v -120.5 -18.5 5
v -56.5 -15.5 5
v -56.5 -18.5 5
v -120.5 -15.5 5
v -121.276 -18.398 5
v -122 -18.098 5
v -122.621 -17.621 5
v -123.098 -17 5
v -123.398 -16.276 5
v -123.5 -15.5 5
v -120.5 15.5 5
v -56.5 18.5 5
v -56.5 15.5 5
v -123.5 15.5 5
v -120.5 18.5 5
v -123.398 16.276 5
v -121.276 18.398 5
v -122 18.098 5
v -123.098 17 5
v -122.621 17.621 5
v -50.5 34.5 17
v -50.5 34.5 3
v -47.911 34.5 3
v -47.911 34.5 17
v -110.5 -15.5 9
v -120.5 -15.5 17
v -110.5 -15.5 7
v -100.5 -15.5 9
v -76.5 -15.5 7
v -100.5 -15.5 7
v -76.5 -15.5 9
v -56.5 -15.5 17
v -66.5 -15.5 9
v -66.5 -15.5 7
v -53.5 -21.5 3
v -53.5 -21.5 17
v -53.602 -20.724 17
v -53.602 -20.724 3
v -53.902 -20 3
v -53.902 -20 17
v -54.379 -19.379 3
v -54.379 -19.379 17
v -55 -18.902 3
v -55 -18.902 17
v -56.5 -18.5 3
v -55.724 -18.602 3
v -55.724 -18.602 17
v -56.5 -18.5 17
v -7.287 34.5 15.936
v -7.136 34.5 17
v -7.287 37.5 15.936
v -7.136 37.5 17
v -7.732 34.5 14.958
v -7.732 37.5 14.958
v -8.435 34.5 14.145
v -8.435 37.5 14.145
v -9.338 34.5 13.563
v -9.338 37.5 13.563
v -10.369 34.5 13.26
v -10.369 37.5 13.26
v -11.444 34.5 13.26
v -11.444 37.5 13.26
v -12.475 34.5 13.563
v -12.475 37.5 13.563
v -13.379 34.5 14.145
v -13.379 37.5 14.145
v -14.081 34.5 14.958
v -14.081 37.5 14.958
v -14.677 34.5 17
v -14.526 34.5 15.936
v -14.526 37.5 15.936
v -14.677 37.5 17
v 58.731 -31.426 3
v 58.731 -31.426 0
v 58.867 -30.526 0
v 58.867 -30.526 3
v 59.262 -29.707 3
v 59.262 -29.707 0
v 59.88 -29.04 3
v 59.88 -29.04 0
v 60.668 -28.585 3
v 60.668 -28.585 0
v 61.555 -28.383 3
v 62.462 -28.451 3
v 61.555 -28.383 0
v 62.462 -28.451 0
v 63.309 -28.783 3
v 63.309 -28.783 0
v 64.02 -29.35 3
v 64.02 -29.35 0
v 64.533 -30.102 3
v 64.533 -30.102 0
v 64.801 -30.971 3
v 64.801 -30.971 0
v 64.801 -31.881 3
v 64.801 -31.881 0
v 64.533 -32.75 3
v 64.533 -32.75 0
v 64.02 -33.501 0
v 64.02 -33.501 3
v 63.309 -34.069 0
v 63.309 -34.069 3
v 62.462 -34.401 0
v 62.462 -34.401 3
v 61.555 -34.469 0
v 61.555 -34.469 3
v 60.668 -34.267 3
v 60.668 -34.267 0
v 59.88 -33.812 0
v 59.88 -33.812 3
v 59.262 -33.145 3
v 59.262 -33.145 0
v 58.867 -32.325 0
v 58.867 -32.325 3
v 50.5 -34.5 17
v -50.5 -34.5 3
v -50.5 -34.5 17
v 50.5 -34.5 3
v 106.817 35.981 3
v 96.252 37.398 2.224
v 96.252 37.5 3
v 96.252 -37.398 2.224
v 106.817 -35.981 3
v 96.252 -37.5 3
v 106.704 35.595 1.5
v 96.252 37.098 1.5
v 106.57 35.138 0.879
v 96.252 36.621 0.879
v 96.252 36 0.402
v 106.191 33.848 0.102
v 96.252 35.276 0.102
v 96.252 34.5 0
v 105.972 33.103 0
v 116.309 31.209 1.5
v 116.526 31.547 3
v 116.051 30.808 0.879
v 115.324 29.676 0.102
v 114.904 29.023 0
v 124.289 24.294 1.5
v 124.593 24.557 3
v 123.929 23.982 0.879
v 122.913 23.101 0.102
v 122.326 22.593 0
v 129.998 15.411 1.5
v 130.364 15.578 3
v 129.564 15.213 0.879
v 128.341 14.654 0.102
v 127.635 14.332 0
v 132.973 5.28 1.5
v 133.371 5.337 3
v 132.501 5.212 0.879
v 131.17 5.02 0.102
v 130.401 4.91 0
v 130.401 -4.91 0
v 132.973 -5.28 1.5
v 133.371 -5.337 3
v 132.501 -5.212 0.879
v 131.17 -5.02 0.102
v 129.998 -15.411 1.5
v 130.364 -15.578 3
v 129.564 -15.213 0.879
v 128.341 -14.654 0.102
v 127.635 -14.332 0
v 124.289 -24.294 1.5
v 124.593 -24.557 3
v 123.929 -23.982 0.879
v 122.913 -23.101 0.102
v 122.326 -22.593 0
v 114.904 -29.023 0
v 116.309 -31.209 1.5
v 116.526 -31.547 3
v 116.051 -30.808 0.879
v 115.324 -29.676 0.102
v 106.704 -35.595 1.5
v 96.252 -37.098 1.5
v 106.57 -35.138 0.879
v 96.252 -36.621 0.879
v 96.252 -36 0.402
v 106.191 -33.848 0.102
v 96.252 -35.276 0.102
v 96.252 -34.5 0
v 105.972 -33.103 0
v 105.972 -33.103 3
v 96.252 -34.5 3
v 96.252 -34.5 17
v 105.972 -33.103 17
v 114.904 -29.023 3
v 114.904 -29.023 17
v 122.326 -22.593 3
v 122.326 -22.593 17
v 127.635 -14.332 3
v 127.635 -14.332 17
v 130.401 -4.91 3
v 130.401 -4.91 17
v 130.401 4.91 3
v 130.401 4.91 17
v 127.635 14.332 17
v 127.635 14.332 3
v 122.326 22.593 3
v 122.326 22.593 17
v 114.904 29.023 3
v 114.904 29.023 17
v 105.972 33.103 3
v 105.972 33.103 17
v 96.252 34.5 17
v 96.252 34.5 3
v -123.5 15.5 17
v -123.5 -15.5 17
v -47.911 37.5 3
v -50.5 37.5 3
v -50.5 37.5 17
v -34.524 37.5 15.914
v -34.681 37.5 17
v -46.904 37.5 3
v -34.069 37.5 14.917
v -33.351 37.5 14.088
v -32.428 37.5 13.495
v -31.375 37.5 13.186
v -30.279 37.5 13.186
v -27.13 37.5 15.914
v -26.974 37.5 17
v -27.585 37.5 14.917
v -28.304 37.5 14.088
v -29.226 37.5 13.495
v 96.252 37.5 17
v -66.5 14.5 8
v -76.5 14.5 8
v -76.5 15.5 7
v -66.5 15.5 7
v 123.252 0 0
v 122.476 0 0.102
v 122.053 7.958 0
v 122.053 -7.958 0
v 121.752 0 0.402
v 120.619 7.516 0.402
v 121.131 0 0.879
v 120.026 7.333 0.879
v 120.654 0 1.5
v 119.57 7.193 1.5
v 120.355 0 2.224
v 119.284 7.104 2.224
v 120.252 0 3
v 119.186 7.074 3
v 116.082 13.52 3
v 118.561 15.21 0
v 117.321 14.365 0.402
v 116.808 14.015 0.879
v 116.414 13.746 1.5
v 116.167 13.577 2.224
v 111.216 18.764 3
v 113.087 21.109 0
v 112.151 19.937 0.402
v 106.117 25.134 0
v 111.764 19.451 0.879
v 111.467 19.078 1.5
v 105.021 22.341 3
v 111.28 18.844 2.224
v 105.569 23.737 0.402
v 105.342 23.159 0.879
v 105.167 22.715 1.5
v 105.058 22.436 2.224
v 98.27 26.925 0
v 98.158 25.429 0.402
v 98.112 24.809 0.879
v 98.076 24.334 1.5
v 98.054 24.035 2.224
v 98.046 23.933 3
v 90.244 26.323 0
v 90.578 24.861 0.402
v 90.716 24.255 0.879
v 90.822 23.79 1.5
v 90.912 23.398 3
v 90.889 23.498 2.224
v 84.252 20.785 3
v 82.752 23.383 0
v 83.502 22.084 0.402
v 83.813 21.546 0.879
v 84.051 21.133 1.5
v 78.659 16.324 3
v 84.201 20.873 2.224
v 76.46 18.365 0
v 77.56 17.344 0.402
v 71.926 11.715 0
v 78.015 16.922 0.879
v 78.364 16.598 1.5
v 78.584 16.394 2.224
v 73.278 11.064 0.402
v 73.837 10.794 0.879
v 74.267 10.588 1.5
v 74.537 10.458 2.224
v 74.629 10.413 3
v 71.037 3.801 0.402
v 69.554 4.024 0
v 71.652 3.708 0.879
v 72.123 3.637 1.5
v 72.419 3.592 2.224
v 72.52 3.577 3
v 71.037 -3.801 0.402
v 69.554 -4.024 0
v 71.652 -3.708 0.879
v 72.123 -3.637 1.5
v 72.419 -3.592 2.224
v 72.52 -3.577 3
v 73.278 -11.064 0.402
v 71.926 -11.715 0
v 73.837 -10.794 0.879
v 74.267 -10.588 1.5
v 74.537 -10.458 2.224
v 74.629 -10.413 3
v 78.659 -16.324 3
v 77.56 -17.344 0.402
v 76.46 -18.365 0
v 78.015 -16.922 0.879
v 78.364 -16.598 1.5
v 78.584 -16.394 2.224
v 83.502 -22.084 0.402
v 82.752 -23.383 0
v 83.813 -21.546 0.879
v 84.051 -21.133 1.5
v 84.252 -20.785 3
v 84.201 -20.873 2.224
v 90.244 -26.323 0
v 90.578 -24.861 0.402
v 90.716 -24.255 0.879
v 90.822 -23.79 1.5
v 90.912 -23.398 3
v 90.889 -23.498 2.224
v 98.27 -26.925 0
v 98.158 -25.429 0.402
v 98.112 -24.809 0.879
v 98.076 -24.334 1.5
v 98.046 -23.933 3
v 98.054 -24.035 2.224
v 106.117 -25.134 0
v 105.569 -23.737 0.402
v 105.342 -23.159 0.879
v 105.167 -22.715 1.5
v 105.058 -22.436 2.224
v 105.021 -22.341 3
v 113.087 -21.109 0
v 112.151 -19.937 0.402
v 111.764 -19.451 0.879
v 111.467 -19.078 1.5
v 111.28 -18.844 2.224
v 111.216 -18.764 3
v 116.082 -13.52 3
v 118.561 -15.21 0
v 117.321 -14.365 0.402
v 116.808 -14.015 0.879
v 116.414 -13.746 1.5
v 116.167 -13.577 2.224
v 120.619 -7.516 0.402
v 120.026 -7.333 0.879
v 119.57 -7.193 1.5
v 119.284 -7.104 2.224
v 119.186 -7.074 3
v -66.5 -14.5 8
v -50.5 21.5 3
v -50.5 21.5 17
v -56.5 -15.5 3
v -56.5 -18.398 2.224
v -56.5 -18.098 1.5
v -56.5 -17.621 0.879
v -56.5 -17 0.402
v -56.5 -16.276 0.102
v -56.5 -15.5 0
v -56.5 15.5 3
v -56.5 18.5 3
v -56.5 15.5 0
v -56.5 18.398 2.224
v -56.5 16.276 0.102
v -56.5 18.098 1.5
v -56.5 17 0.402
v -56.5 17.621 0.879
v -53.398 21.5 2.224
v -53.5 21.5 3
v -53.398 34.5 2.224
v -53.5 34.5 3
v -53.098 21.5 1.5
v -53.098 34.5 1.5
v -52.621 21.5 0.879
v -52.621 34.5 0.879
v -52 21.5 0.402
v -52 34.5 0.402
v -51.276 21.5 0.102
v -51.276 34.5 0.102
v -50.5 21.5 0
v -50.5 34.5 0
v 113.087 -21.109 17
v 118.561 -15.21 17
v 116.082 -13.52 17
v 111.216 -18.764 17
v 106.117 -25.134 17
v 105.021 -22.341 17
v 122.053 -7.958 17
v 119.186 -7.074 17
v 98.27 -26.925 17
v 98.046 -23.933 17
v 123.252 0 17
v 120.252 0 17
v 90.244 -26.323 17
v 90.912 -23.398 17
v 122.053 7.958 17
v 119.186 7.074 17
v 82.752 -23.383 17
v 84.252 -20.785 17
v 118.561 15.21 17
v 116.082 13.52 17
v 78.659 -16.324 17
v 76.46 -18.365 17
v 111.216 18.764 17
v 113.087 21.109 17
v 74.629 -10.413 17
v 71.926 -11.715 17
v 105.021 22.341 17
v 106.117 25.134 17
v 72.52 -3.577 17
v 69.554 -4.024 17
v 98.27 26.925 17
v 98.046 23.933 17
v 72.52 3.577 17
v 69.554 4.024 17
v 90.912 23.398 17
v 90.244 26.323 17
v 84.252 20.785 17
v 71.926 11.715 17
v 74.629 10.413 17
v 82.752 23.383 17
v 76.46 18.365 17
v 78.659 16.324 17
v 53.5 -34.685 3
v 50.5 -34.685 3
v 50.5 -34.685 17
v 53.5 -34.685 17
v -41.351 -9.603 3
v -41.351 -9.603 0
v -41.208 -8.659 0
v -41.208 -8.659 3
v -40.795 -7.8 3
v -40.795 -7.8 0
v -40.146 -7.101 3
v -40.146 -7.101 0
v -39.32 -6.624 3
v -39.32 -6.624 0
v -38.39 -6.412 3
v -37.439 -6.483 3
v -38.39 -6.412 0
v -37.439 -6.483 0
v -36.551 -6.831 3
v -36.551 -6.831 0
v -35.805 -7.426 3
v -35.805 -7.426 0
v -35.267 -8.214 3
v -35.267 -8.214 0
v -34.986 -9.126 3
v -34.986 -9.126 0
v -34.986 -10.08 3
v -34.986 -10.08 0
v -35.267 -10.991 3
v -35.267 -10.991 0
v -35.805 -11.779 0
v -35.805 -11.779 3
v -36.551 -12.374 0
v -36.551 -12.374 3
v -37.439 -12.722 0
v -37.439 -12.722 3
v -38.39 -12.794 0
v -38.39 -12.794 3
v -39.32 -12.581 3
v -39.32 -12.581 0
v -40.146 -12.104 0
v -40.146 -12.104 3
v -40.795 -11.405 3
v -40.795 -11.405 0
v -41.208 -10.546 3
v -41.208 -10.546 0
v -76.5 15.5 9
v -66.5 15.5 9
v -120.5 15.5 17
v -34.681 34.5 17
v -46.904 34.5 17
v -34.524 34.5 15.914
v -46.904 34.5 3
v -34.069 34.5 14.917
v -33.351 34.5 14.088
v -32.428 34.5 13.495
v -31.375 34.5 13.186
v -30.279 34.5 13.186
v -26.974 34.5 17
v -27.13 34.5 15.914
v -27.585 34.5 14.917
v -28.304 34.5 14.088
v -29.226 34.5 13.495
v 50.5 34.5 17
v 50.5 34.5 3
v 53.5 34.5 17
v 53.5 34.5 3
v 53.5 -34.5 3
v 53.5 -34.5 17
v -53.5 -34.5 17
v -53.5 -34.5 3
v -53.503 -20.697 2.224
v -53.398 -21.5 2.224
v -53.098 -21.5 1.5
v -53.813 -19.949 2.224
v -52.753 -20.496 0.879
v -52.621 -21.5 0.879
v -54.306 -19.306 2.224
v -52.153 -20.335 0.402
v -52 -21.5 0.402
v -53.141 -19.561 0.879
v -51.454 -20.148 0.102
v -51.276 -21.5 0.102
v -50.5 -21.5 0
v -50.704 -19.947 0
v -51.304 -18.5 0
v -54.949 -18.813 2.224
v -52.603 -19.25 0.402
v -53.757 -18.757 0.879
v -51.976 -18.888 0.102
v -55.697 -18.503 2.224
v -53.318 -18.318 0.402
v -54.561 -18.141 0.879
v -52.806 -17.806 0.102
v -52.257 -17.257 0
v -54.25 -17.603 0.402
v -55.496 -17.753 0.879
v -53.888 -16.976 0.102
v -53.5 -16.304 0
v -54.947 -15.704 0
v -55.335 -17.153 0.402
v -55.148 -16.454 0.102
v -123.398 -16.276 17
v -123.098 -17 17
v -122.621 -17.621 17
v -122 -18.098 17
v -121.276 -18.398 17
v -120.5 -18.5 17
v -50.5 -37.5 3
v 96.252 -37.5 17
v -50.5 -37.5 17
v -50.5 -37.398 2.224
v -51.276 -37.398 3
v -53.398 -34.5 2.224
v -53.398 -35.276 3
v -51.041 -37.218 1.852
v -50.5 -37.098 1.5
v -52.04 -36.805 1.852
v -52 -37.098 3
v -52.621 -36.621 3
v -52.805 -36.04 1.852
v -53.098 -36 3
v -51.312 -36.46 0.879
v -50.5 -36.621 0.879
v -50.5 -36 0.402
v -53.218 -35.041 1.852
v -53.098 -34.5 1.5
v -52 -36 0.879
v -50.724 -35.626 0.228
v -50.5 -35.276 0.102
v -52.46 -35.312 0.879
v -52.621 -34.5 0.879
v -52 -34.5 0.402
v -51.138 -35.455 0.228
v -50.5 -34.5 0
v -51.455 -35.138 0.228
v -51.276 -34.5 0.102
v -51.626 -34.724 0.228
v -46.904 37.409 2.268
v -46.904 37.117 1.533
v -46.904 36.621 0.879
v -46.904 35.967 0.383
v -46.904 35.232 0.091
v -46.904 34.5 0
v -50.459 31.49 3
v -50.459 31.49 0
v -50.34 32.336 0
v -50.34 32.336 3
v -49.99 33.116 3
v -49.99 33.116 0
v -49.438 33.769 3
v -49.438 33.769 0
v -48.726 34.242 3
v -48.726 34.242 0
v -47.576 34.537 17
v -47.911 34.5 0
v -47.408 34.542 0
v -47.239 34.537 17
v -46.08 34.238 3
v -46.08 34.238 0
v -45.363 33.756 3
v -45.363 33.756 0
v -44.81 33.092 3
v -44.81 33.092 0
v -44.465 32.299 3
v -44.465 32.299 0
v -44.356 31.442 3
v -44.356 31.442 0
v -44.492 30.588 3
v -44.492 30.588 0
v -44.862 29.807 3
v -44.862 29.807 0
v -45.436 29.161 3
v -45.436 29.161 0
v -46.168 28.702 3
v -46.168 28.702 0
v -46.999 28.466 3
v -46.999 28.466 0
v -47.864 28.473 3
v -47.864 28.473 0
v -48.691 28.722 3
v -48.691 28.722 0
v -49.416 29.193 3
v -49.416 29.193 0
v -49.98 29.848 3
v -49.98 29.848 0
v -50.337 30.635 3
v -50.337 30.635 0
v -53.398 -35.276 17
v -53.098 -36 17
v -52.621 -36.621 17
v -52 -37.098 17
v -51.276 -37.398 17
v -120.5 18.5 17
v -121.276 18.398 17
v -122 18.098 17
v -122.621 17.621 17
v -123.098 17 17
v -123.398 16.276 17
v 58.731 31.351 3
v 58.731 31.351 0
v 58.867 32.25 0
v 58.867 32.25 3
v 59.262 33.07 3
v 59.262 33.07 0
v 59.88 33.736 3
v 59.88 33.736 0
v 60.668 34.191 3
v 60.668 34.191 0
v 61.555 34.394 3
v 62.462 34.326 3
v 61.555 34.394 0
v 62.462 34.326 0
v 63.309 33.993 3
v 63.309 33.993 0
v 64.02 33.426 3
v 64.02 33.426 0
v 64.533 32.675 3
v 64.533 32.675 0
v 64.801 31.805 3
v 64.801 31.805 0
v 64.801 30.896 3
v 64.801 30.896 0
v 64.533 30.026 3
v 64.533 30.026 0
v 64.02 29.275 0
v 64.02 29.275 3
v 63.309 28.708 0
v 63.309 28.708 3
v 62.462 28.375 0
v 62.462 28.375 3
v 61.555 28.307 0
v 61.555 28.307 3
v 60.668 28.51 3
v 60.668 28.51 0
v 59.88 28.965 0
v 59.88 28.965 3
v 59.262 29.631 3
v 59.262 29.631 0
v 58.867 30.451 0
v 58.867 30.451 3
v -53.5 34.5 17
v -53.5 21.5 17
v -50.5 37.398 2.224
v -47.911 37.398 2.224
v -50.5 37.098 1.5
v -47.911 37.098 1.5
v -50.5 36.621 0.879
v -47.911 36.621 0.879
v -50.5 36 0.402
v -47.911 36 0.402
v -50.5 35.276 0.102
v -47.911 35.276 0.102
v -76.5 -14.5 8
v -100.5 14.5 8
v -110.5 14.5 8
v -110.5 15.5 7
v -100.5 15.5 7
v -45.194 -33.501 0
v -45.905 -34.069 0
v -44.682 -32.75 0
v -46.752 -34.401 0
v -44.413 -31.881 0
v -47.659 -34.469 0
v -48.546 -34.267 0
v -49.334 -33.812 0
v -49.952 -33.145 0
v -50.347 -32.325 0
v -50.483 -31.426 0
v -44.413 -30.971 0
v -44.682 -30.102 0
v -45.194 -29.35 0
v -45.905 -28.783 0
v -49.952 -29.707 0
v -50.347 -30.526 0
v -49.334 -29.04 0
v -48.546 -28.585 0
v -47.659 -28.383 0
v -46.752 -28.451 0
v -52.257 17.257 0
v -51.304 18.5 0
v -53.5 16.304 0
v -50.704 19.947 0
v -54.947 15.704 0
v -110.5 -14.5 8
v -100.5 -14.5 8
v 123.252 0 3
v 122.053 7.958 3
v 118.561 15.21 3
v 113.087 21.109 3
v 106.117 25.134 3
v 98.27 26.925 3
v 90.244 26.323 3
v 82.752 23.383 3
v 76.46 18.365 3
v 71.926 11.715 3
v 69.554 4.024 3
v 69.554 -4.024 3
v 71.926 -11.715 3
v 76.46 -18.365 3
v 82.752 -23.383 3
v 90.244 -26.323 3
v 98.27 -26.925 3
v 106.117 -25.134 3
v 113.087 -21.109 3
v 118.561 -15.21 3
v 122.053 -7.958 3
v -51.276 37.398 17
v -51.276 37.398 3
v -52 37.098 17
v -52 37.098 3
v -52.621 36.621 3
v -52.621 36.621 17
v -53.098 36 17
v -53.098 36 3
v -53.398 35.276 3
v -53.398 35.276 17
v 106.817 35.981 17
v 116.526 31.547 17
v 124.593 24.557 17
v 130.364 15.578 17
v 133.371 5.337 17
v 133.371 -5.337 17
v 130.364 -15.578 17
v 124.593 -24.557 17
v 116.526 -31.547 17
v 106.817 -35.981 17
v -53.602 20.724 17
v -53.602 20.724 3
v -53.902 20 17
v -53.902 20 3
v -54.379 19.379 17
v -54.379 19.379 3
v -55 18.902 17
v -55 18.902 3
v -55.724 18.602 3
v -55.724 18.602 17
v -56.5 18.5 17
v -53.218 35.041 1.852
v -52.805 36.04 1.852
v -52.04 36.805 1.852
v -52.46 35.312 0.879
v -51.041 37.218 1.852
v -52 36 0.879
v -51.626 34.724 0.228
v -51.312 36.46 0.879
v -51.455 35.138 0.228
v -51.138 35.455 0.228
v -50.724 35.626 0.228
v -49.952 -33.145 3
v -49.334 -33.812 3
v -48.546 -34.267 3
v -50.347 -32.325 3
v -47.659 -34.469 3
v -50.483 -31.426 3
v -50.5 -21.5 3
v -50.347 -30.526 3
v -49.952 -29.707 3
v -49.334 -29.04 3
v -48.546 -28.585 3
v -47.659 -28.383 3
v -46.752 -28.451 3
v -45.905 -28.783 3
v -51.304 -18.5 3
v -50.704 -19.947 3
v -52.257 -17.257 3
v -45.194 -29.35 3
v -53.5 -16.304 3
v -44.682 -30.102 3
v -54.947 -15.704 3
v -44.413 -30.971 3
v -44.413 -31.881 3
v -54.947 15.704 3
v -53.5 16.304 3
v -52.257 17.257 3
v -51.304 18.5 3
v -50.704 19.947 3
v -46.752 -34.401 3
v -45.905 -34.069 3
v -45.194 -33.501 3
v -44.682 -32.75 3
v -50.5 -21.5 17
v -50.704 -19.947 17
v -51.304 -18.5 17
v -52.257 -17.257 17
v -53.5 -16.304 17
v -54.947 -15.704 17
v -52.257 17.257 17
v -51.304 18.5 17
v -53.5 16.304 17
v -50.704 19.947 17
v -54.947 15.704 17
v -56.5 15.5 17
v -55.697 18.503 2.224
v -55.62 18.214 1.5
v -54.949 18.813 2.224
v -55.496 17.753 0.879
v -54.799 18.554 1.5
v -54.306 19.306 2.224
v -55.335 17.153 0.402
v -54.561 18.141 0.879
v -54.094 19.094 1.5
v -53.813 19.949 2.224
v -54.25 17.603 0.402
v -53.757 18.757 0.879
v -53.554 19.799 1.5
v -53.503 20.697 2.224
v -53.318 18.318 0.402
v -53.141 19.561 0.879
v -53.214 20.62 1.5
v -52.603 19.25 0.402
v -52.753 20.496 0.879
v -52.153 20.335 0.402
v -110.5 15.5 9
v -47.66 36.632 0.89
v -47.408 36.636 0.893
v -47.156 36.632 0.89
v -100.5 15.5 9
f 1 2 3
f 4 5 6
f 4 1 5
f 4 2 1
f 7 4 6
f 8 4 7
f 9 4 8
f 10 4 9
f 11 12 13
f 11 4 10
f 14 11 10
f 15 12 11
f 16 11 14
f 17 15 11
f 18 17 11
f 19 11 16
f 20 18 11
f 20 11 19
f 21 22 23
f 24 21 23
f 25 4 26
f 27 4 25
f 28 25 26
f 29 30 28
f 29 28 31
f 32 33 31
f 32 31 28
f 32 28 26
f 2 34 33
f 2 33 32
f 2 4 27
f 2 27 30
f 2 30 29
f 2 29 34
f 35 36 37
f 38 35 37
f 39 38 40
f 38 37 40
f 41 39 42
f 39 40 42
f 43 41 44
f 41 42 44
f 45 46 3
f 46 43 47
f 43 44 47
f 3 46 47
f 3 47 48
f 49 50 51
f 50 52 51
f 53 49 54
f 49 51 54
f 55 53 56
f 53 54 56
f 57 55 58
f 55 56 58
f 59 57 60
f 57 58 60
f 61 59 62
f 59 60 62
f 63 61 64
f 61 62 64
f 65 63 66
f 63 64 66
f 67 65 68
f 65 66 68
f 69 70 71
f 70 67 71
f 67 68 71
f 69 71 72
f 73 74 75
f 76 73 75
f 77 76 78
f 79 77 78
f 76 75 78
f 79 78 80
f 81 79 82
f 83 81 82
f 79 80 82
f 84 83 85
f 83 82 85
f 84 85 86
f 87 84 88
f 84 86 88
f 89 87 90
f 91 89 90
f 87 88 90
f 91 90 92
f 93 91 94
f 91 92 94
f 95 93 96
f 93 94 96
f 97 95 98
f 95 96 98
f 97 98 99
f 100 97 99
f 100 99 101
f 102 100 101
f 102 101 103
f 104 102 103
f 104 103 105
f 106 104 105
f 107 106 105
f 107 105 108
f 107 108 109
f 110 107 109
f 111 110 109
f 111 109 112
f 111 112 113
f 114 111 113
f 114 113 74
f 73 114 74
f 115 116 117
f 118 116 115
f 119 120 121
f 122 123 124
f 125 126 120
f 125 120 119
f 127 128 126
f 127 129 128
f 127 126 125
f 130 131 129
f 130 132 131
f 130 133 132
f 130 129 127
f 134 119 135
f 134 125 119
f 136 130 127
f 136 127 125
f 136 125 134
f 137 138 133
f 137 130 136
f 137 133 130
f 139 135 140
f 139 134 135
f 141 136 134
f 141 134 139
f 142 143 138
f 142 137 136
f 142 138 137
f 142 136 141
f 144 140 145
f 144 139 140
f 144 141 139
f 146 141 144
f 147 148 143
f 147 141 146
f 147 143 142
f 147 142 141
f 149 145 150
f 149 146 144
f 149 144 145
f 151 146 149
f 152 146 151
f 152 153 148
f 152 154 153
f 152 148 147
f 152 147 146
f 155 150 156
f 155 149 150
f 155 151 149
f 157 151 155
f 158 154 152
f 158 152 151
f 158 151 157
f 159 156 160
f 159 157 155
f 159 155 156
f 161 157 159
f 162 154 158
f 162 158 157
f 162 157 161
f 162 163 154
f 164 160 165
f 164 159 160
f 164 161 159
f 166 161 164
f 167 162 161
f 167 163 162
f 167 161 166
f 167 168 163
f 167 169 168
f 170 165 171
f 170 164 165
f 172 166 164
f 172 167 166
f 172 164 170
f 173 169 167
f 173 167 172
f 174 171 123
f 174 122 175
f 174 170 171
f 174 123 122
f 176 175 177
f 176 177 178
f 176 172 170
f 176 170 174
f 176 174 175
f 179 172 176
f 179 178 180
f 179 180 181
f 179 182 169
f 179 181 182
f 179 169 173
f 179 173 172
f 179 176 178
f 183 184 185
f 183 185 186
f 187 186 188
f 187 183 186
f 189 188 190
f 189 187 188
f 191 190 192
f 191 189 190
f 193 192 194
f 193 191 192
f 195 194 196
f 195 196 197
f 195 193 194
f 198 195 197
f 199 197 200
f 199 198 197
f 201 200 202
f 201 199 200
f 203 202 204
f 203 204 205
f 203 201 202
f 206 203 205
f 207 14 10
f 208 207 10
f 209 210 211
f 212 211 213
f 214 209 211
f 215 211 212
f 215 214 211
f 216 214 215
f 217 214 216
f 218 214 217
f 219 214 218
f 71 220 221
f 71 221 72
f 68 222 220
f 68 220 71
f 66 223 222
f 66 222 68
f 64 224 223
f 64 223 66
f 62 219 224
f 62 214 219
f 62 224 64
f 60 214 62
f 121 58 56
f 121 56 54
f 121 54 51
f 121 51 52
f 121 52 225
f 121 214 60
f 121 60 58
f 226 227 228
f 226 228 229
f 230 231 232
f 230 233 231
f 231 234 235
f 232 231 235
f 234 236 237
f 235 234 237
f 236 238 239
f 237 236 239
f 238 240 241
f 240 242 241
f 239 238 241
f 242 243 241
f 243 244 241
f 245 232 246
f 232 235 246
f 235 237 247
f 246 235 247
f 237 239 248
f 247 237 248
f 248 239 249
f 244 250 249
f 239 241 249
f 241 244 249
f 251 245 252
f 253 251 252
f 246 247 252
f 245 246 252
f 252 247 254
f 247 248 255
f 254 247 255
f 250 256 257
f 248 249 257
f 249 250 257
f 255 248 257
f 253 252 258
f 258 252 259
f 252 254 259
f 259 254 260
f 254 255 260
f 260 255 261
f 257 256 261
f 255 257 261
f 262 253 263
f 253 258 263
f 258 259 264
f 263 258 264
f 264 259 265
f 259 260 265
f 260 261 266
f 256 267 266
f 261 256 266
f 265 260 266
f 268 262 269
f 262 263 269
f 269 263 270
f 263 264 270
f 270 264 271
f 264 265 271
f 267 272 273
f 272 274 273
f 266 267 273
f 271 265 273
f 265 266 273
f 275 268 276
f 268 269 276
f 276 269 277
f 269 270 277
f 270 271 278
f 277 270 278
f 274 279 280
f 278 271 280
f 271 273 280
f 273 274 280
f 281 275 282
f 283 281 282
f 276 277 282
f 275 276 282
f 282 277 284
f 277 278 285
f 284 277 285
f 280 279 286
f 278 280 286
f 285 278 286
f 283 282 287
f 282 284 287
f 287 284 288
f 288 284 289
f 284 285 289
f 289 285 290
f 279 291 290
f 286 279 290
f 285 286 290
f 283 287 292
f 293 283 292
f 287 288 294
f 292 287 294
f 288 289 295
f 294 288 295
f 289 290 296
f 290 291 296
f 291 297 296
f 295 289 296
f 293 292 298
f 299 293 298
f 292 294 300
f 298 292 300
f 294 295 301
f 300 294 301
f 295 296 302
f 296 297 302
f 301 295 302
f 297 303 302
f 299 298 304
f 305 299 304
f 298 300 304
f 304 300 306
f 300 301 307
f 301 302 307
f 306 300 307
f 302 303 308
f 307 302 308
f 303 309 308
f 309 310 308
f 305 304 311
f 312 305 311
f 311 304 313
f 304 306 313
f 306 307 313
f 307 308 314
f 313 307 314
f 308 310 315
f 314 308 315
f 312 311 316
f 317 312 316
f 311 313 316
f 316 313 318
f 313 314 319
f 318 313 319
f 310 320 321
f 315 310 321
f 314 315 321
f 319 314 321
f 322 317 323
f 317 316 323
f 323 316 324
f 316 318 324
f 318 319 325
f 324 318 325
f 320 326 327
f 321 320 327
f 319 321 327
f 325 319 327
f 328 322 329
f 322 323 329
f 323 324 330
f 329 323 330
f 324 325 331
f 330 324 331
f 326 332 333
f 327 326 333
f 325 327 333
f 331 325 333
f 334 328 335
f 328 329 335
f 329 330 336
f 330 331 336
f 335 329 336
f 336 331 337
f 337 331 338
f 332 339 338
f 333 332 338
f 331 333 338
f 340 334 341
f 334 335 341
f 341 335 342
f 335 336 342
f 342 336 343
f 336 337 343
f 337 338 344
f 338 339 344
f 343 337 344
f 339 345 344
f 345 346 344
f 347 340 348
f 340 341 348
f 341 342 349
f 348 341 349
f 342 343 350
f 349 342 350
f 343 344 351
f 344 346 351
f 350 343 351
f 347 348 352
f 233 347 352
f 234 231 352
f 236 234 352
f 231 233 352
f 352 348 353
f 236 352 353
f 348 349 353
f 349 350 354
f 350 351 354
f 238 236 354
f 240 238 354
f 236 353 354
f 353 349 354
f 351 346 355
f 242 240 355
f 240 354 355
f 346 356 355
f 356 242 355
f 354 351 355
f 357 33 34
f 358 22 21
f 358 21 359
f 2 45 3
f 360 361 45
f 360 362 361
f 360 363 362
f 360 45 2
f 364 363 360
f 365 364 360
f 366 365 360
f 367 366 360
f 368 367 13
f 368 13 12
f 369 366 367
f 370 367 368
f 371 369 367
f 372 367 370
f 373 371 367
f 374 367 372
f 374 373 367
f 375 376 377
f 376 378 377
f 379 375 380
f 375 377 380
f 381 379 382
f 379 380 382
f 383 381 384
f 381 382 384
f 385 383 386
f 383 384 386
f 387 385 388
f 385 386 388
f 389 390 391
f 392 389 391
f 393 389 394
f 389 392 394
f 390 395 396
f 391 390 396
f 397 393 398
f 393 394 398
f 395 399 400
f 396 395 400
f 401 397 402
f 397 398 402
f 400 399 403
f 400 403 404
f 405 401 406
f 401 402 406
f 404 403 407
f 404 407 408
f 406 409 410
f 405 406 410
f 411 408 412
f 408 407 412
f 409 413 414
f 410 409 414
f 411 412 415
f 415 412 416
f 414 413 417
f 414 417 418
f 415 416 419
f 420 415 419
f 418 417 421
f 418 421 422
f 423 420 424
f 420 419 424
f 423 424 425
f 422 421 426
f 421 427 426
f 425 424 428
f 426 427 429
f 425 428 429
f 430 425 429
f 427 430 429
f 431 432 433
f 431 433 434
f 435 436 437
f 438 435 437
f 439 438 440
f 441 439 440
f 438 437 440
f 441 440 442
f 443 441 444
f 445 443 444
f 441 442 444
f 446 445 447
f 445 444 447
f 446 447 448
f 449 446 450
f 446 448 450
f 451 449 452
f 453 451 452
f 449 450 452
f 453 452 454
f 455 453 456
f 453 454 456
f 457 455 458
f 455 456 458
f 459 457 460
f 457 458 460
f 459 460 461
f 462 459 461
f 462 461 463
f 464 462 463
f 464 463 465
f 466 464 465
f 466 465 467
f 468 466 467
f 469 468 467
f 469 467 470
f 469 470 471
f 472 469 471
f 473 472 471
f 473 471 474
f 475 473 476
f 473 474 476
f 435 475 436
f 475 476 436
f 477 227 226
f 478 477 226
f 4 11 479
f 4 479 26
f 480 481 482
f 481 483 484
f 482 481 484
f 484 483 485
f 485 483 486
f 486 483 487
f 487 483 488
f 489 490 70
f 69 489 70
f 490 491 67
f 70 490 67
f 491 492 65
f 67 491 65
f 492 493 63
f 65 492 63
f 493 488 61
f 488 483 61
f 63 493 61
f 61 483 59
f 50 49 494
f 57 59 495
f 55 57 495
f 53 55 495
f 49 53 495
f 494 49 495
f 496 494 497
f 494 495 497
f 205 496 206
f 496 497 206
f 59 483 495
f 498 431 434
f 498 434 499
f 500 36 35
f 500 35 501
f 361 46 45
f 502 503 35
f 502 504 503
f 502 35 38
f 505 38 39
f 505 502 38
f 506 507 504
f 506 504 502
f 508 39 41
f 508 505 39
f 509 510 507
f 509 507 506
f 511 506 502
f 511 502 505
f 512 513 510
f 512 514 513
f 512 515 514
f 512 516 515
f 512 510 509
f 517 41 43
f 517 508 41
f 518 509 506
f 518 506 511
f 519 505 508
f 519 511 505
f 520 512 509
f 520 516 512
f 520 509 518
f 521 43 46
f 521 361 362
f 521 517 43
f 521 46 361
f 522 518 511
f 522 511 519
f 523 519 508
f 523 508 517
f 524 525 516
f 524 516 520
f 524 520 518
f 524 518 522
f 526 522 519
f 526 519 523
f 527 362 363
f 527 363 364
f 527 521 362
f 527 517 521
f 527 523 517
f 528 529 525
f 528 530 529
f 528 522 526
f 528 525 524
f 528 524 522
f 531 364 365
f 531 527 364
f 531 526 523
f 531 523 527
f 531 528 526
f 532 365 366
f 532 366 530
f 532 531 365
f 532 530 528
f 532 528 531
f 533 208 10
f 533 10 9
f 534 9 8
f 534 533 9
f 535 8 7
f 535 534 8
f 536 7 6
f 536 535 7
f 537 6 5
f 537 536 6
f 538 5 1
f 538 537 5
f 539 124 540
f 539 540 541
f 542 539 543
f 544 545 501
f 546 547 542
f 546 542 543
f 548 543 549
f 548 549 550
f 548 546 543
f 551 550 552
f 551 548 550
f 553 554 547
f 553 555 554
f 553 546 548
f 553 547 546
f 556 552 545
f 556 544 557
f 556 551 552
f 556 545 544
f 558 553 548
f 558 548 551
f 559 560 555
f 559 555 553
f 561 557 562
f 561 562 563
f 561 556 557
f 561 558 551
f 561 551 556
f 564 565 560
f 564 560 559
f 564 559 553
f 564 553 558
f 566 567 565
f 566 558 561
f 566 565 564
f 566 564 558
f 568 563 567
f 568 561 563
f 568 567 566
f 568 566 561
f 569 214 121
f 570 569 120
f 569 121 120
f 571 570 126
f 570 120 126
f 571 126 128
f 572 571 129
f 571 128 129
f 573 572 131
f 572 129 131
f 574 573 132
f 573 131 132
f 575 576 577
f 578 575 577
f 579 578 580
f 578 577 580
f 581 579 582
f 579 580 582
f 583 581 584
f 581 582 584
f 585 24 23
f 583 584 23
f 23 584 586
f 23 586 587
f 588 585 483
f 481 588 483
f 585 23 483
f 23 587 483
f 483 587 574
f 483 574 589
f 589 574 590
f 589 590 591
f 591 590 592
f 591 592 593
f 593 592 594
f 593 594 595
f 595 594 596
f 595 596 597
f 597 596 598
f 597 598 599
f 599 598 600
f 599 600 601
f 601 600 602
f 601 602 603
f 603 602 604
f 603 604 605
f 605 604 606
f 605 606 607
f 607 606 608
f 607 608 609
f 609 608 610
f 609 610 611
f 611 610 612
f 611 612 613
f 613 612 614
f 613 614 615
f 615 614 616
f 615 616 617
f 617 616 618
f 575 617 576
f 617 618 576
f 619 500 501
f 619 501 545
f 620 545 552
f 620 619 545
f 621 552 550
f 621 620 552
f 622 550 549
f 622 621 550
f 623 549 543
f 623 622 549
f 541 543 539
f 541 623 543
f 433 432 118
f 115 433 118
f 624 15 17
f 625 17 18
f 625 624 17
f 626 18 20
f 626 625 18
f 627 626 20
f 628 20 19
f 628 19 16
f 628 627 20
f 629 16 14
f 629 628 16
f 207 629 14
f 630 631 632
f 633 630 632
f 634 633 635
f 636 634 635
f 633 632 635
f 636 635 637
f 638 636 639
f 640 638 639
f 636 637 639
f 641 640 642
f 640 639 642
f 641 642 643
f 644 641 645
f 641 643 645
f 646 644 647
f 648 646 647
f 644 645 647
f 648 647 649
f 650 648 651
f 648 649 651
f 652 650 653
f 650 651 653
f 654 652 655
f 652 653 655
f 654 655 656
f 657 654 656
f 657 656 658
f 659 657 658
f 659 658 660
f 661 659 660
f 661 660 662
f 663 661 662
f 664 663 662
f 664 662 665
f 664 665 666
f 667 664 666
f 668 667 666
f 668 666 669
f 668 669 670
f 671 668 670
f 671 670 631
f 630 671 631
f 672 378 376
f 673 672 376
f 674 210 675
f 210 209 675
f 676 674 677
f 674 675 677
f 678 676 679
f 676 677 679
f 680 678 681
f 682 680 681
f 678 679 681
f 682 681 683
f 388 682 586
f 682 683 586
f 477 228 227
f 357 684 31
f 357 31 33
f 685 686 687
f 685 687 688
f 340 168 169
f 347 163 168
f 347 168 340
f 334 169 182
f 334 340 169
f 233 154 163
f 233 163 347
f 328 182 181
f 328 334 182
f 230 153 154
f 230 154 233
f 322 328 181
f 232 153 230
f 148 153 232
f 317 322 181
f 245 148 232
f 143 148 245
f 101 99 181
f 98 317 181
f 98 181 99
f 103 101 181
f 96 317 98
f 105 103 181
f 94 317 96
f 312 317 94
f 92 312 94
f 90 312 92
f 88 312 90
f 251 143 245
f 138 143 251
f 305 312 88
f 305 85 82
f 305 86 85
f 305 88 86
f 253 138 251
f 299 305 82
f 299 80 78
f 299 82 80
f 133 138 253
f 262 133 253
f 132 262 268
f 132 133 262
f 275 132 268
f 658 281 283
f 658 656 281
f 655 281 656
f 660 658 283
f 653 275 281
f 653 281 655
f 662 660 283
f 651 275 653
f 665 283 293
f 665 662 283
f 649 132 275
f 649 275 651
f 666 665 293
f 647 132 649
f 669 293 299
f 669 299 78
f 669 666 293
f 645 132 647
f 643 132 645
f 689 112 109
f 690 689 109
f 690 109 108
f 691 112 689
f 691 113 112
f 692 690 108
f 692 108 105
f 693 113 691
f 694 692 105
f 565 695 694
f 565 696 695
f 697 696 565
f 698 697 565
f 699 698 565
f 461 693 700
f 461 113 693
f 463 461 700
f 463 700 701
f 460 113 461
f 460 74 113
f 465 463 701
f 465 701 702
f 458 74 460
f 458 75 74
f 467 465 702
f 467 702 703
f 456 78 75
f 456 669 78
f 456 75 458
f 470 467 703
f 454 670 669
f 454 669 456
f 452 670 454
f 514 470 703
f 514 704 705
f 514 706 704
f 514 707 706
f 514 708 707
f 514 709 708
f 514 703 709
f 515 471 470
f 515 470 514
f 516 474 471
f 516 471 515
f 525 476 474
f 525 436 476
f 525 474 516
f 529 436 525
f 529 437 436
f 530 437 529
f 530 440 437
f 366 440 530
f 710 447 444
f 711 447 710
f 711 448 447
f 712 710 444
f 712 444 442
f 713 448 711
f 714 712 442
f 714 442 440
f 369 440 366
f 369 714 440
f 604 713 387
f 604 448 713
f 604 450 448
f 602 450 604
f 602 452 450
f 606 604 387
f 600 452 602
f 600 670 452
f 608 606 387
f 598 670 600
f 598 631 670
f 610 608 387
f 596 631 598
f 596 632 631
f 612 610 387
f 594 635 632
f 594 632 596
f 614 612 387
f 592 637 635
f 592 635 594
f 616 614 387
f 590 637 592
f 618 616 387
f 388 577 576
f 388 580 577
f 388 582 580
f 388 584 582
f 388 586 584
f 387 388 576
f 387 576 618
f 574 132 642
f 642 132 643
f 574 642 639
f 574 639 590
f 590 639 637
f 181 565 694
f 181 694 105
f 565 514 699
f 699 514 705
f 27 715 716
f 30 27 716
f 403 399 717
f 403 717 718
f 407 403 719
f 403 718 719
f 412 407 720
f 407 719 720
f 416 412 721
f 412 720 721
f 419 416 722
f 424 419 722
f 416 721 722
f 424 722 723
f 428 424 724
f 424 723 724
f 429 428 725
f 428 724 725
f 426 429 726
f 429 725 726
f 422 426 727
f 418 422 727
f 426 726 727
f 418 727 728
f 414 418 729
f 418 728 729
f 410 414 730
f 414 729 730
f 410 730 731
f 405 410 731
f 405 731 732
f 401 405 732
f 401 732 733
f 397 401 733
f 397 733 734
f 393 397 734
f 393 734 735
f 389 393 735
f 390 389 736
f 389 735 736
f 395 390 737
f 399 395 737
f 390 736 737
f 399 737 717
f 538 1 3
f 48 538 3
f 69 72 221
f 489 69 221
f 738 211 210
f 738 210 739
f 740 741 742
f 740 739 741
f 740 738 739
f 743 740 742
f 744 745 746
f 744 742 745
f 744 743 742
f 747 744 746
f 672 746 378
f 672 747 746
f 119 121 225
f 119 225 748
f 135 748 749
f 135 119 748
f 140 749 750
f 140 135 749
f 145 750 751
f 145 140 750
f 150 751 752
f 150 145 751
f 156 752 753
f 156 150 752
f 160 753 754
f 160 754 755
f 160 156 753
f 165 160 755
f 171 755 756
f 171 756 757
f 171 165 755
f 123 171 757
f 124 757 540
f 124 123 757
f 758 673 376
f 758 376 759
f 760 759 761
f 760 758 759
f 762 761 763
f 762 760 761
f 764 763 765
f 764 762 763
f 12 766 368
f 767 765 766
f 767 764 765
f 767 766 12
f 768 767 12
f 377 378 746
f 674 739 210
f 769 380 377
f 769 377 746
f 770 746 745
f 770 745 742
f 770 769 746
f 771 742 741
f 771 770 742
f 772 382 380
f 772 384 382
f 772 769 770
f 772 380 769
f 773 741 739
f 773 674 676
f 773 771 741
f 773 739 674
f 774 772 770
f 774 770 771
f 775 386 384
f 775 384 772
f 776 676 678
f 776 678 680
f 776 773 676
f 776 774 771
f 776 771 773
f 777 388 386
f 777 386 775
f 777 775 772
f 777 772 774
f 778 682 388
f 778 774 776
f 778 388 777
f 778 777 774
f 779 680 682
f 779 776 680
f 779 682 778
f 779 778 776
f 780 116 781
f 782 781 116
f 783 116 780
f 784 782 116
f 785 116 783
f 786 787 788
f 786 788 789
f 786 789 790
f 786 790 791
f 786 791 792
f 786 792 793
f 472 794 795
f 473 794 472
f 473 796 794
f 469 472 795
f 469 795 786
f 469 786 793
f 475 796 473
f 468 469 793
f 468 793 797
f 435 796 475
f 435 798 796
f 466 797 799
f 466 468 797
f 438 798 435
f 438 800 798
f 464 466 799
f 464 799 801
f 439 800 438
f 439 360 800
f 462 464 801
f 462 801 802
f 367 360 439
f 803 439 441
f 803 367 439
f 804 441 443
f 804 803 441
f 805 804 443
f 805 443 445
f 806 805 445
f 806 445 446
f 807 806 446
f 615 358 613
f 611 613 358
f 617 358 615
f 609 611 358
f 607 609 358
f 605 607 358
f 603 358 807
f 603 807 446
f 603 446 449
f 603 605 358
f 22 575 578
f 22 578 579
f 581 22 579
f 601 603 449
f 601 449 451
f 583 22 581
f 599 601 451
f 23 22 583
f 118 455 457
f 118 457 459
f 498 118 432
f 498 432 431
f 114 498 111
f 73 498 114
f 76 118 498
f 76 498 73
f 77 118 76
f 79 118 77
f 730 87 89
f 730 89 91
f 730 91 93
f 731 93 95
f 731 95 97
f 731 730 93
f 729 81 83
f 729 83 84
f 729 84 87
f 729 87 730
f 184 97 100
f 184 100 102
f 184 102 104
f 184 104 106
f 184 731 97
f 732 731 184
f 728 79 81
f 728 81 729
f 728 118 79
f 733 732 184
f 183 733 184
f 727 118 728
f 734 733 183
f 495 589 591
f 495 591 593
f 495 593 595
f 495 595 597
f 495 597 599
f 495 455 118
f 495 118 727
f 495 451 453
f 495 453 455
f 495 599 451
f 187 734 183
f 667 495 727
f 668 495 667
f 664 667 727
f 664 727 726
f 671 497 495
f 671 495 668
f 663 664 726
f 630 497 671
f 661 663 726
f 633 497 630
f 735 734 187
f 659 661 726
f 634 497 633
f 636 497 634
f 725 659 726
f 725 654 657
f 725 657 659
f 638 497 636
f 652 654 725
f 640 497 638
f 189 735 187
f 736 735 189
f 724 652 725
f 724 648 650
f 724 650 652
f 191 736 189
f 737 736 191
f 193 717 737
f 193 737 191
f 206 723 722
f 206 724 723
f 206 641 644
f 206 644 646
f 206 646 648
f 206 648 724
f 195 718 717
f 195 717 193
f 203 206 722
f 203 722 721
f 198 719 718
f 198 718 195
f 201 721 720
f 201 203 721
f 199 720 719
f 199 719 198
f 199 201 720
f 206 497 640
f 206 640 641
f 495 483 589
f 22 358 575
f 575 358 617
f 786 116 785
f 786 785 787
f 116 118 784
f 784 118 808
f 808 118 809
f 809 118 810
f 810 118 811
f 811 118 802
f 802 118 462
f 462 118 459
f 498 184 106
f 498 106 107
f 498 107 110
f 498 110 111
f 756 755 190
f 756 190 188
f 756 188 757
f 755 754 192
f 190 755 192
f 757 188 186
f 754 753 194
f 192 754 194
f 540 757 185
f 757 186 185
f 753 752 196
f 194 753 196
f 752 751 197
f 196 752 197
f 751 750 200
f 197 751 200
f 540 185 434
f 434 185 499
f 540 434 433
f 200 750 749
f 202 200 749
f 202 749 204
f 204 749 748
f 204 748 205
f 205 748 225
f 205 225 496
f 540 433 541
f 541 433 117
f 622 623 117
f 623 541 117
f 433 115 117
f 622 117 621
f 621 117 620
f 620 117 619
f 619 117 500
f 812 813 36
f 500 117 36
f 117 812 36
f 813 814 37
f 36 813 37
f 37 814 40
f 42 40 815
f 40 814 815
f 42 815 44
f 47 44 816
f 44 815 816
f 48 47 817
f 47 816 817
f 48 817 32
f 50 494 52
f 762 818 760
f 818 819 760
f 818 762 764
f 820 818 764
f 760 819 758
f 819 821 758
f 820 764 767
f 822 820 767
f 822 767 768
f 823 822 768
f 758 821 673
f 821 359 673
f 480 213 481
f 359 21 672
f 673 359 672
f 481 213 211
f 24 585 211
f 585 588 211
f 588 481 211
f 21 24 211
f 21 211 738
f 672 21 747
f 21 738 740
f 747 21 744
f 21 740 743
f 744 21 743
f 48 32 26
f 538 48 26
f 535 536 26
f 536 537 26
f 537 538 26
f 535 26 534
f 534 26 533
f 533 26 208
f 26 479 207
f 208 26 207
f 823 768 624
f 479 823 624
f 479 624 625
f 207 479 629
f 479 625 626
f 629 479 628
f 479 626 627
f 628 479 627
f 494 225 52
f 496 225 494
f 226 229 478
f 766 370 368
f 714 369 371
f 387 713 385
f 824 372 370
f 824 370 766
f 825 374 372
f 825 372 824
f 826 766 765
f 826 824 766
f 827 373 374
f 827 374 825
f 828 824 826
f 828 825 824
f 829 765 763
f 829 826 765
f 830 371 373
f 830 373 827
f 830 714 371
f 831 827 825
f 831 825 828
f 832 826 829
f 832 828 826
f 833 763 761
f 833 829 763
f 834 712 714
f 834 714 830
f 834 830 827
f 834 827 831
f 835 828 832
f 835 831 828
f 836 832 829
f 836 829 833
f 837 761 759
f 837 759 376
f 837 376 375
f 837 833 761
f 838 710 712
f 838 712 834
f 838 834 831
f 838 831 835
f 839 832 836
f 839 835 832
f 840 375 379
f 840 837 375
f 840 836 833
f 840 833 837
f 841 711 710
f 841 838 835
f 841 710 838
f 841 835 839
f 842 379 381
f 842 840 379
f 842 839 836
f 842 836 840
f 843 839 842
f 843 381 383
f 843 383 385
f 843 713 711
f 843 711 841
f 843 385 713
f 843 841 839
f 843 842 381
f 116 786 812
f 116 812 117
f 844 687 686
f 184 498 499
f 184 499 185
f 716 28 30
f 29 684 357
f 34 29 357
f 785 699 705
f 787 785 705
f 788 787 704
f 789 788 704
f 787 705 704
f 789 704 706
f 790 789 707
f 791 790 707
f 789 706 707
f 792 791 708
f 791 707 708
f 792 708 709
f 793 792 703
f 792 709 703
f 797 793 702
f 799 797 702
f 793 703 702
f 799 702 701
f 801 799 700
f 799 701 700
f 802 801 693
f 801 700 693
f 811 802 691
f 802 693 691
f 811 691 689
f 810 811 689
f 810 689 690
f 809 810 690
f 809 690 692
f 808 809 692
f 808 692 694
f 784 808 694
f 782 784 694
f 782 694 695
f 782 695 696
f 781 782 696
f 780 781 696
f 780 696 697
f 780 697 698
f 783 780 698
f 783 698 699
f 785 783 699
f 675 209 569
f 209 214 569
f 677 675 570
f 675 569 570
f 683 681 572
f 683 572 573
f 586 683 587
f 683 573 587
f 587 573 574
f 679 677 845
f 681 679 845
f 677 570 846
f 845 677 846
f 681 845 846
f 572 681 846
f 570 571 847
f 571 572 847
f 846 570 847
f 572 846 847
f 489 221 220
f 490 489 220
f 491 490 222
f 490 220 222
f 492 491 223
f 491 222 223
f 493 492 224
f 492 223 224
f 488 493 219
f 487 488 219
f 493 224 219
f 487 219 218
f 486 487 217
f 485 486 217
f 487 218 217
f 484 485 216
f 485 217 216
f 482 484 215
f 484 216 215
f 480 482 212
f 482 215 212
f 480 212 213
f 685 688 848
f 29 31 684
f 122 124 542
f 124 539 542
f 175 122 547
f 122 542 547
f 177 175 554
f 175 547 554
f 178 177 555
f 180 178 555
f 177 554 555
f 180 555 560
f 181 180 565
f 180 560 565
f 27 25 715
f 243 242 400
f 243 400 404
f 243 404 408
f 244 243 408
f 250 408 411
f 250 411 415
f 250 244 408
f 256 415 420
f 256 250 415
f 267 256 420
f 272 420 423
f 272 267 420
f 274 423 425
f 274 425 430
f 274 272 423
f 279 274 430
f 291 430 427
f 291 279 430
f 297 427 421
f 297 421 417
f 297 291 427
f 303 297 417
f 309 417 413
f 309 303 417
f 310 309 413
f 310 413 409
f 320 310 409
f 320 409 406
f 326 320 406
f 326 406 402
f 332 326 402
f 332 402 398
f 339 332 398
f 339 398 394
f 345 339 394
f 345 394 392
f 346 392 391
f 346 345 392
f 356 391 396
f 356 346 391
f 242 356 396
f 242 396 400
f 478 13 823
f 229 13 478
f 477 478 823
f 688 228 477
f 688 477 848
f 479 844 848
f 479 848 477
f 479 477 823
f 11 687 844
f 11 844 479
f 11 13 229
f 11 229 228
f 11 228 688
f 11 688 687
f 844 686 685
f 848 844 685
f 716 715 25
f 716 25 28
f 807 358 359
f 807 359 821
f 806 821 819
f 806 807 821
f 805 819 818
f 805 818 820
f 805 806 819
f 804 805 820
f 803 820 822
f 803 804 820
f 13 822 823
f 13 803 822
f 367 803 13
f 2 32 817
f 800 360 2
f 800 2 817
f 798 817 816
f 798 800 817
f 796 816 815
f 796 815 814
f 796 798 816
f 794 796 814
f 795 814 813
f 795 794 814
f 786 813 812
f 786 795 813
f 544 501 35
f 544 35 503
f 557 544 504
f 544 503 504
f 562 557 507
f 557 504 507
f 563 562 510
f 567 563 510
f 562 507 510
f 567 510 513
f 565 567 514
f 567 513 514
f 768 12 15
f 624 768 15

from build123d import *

# Parameters (mm, degrees)
BOSS_EXTRUDE1_DEPTH = 17
FILLET1_R           = 3
SHELL2_START        = 3
SHELL2_DEPTH        = 14
CUT_EXTRUDE1_START  = 3
SKETCH2_W           = 3
SKETCH2_H           = 69.184745233
CUT_EXTRUDE1_DEPTH  = 14
SKETCH4_R           = 24
BOSS_EXTRUDE2_DEPTH = 17
SHELL4_START        = 3
SHELL4_OUTLINE_R    = 27
SHELL4_DEPTH        = 14
SKETCH7_W           = 3
SKETCH7_H           = 69
CUT_EXTRUDE3_DEPTH  = 14
SKETCH8_R           = 3.051675087
CUT_EXTRUDE4_DEPTH  = 20
SKETCH9_R           = 3.853535646
SKETCH9_R_2         = 3.770722203
CUT_EXTRUDE5_DEPTH  = 20
SKETCH11_W          = 68.674120891
SKETCH11_H          = 38.021066824
CUT_EXTRUDE8_DEPTH  = 5
SKETCH15_W          = 10
SKETCH15_H          = 2
BOSS_EXTRUDE3_DEPTH = 1
CHAMFER1_SIZE       = 1
SKETCH14_W          = 10
SKETCH14_H          = 2
BOSS_EXTRUDE4_DEPTH = 1
CHAMFER2_SIZE       = 1
FILLET2_R           = 3
SKETCH16_R          = 3.2
CUT_EXTRUDE9_DEPTH  = 3


# Read off the part's stored shape, not the designer's step: Shell2, Shell4
with BuildPart() as part:
    # Sketch1 → Boss-Extrude1 (new body)
    with BuildSketch(Plane.XY):
        Polygon((-53.5, -18.5), (-53.5, -37.5), (53.5, -37.5), (53.5, 37.5), (-53.5, 37.5), (-53.5, 18.5), (-123.5, 18.5), (-123.5, -18.5), align=None)
    extrude(amount=BOSS_EXTRUDE1_DEPTH)

    # Fillet1
    fillet1_edges = [part.edges().sort_by_distance(p)[0] for p in [
        (-53.5, -37.5, 8.5),
        (-53.5, -18.5, 8.5),
        (-123.5, -18.5, 8.5),
        (-123.5, 18.5, 8.5),
        (-53.5, 18.5, 8.5),
        (-53.5, 37.5, 8.5),
    ]]
    fillet(fillet1_edges, radius=FILLET1_R)

    # Shell2 outline → Shell2 (cut)
    with BuildSketch(Plane.XY.offset(SHELL2_START)):
        with BuildLine():
            Line((50.5, -34.5), (50.5, 34.5))
            Line((50.5, 34.5), (-50.5, 34.5))
            Line((-50.5, 34.5), (-50.5, 21.5))
            ThreePointArc((-50.5, 21.5), (-52.257359313, 17.257359313), (-56.5, 15.5))
            Line((-56.5, 15.5), (-120.5, 15.5))
            Line((-120.5, 15.5), (-120.5, -15.5))
            Line((-120.5, -15.5), (-56.5, -15.5))
            ThreePointArc((-56.5, -15.5), (-52.257359313, -17.257359313), (-50.5, -21.5))
            Line((-50.5, -21.5), (-50.5, -34.5))
            Line((-50.5, -34.5), (50.5, -34.5))
        make_face()
    extrude(amount=SHELL2_DEPTH, mode=Mode.SUBTRACT)

    # Sketch2 → Cut-Extrude1 (cut)
    with BuildSketch(Plane.XY.offset(CUT_EXTRUDE1_START)):
        with Locations((52, -0.092372617)):
            Rectangle(SKETCH2_W, SKETCH2_H)
    extrude(amount=CUT_EXTRUDE1_DEPTH, mode=Mode.SUBTRACT)

    # Sketch4 → Boss-Extrude2 (add)
    with BuildSketch(Plane.XY):
        with BuildLine():
            Line((53.5, 37.5), (96.25236473, 37.5))
            ThreePointArc((96.25236473, 37.5), (133.75236473, 0), (96.25236473, -37.5))
            Line((96.25236473, -37.5), (53.5, -37.5))
            Line((53.5, -37.5), (53.5, 37.5))
        make_face()
        with Locations((96.25236473, 0)):
            Circle(SKETCH4_R, mode=Mode.SUBTRACT)
    extrude(amount=BOSS_EXTRUDE2_DEPTH)

    # Shell4 outline → Shell4 (cut)
    with BuildSketch(Plane.XY.offset(SHELL4_START)):
        with BuildLine():
            Line((96.25236473, 34.5), (56.5, 34.5))
            Line((56.5, 34.5), (56.5, -34.5))
            Line((56.5, -34.5), (96.25236473, -34.5))
            ThreePointArc((96.25236473, -34.5), (130.75236473, 0), (96.25236473, 34.5))
        make_face()
        with Locations((96.25236473, 0)):
            Circle(SHELL4_OUTLINE_R, mode=Mode.SUBTRACT)
    extrude(amount=SHELL4_DEPTH, mode=Mode.SUBTRACT)

    # Sketch7 → Cut-Extrude3 (cut)
    with BuildSketch(Plane.XY.offset(17)):
        with Locations((55, 0)):
            Rectangle(SKETCH7_W, SKETCH7_H)
    extrude(amount=-CUT_EXTRUDE3_DEPTH, mode=Mode.SUBTRACT)

    # Sketch8 → Cut-Extrude4 (cut)
    with BuildSketch(Plane(origin=(0, 0, 0), x_dir=(-1, 0, 0), z_dir=(0, 0, -1))):
        with Locations((47.431025643, -31.425786946)):
            Circle(SKETCH8_R)
        with Locations((47.407650962, 31.49020456)):
            Circle(SKETCH8_R)
        with Locations((-61.783104826, 31.350542021)):
            Circle(SKETCH8_R)
        with Locations((-61.783104826, -31.425786946)):
            Circle(SKETCH8_R)
    extrude(amount=-CUT_EXTRUDE4_DEPTH, mode=Mode.SUBTRACT)

    # Sketch9 → Cut-Extrude5 (cut)
    with BuildSketch(Plane(origin=(0, 37.5, 0), x_dir=(1, 0, 0), z_dir=(0, 1, 0))):
        with Locations((-30.827052477, -17)):
            Circle(SKETCH9_R)
        with Locations((-10.906615981, -16.992280087)):
            Circle(SKETCH9_R_2)
    extrude(amount=-CUT_EXTRUDE5_DEPTH, mode=Mode.SUBTRACT)

    # Sketch11 → Cut-Extrude8 (cut)
    with BuildSketch(Plane(origin=(0, 0, 0), x_dir=(-1, 0, 0), z_dir=(0, 0, -1))):
        with Locations((90.837060446, -0.510533412)):
            Rectangle(SKETCH11_W, SKETCH11_H)
    extrude(amount=-CUT_EXTRUDE8_DEPTH, mode=Mode.SUBTRACT)

    # Sketch15 → Boss-Extrude3 (add)
    with BuildSketch(Plane.XZ.offset(-15.5)):
        with Locations((-71.5, 8)):
            Rectangle(SKETCH15_W, SKETCH15_H)
        with Locations((-105.5, 8)):
            Rectangle(SKETCH15_W, SKETCH15_H)
    extrude(amount=BOSS_EXTRUDE3_DEPTH)

    # Chamfer1
    chamfer1_edges = [part.edges().sort_by_distance(p)[0] for p in [
        (-105.5, 14.5, 9),
        (-105.5, 14.5, 7),
        (-71.5, 14.5, 9),
        (-71.5, 14.5, 7),
    ]]
    chamfer(chamfer1_edges, length=CHAMFER1_SIZE - 0.0001)  # a hair under: the kernel refuses the full size

    # Sketch14 → Boss-Extrude4 (add)
    with BuildSketch(Plane(origin=(0, -15.5, 0), x_dir=(1, 0, 0), z_dir=(0, 1, 0))):
        with Locations((-71.5, -8)):
            Rectangle(SKETCH14_W, SKETCH14_H)
        with Locations((-105.5, -8)):
            Rectangle(SKETCH14_W, SKETCH14_H)
    extrude(amount=BOSS_EXTRUDE4_DEPTH)

    # Chamfer2
    chamfer2_edges = [part.edges().sort_by_distance(p)[0] for p in [
        (-105.5, -14.5, 7),
        (-105.5, -14.5, 9),
        (-71.5, -14.5, 9),
        (-71.5, -14.5, 7),
    ]]
    chamfer(chamfer2_edges, length=CHAMFER2_SIZE - 0.0001)  # a hair under: the kernel refuses the full size

    # Fillet2
    fillet2_edges = [part.edges().sort_by_distance(p)[0] for p in [
        (72.25236473, 0, 0),
        (133.75236473, 0, 0),
        (22.876182365, 37.5, 0),
        (22.876182365, -37.5, 0),
        (-53.5, -28, 0),
        (-53.5, 28, 0),
        (-52.621320344, 36.621320344, 0),
        (-52.621320344, -36.621320344, 0),
        (-54.378679656, -19.378679656, 0),
        (-54.378679656, 19.378679656, 0),
    ]]
    fillet(fillet2_edges, radius=FILLET2_R)

    # Sketch16 → Cut-Extrude9 (cut)
    with BuildSketch(Plane(origin=(0, 0, 0), x_dir=(-1, 0, 0), z_dir=(0, 0, -1))):
        with Locations((38.150596078, -9.60262109)):
            Circle(SKETCH16_R)
    extrude(amount=-CUT_EXTRUDE9_DEPTH, mode=Mode.SUBTRACT)


solid = part.part
